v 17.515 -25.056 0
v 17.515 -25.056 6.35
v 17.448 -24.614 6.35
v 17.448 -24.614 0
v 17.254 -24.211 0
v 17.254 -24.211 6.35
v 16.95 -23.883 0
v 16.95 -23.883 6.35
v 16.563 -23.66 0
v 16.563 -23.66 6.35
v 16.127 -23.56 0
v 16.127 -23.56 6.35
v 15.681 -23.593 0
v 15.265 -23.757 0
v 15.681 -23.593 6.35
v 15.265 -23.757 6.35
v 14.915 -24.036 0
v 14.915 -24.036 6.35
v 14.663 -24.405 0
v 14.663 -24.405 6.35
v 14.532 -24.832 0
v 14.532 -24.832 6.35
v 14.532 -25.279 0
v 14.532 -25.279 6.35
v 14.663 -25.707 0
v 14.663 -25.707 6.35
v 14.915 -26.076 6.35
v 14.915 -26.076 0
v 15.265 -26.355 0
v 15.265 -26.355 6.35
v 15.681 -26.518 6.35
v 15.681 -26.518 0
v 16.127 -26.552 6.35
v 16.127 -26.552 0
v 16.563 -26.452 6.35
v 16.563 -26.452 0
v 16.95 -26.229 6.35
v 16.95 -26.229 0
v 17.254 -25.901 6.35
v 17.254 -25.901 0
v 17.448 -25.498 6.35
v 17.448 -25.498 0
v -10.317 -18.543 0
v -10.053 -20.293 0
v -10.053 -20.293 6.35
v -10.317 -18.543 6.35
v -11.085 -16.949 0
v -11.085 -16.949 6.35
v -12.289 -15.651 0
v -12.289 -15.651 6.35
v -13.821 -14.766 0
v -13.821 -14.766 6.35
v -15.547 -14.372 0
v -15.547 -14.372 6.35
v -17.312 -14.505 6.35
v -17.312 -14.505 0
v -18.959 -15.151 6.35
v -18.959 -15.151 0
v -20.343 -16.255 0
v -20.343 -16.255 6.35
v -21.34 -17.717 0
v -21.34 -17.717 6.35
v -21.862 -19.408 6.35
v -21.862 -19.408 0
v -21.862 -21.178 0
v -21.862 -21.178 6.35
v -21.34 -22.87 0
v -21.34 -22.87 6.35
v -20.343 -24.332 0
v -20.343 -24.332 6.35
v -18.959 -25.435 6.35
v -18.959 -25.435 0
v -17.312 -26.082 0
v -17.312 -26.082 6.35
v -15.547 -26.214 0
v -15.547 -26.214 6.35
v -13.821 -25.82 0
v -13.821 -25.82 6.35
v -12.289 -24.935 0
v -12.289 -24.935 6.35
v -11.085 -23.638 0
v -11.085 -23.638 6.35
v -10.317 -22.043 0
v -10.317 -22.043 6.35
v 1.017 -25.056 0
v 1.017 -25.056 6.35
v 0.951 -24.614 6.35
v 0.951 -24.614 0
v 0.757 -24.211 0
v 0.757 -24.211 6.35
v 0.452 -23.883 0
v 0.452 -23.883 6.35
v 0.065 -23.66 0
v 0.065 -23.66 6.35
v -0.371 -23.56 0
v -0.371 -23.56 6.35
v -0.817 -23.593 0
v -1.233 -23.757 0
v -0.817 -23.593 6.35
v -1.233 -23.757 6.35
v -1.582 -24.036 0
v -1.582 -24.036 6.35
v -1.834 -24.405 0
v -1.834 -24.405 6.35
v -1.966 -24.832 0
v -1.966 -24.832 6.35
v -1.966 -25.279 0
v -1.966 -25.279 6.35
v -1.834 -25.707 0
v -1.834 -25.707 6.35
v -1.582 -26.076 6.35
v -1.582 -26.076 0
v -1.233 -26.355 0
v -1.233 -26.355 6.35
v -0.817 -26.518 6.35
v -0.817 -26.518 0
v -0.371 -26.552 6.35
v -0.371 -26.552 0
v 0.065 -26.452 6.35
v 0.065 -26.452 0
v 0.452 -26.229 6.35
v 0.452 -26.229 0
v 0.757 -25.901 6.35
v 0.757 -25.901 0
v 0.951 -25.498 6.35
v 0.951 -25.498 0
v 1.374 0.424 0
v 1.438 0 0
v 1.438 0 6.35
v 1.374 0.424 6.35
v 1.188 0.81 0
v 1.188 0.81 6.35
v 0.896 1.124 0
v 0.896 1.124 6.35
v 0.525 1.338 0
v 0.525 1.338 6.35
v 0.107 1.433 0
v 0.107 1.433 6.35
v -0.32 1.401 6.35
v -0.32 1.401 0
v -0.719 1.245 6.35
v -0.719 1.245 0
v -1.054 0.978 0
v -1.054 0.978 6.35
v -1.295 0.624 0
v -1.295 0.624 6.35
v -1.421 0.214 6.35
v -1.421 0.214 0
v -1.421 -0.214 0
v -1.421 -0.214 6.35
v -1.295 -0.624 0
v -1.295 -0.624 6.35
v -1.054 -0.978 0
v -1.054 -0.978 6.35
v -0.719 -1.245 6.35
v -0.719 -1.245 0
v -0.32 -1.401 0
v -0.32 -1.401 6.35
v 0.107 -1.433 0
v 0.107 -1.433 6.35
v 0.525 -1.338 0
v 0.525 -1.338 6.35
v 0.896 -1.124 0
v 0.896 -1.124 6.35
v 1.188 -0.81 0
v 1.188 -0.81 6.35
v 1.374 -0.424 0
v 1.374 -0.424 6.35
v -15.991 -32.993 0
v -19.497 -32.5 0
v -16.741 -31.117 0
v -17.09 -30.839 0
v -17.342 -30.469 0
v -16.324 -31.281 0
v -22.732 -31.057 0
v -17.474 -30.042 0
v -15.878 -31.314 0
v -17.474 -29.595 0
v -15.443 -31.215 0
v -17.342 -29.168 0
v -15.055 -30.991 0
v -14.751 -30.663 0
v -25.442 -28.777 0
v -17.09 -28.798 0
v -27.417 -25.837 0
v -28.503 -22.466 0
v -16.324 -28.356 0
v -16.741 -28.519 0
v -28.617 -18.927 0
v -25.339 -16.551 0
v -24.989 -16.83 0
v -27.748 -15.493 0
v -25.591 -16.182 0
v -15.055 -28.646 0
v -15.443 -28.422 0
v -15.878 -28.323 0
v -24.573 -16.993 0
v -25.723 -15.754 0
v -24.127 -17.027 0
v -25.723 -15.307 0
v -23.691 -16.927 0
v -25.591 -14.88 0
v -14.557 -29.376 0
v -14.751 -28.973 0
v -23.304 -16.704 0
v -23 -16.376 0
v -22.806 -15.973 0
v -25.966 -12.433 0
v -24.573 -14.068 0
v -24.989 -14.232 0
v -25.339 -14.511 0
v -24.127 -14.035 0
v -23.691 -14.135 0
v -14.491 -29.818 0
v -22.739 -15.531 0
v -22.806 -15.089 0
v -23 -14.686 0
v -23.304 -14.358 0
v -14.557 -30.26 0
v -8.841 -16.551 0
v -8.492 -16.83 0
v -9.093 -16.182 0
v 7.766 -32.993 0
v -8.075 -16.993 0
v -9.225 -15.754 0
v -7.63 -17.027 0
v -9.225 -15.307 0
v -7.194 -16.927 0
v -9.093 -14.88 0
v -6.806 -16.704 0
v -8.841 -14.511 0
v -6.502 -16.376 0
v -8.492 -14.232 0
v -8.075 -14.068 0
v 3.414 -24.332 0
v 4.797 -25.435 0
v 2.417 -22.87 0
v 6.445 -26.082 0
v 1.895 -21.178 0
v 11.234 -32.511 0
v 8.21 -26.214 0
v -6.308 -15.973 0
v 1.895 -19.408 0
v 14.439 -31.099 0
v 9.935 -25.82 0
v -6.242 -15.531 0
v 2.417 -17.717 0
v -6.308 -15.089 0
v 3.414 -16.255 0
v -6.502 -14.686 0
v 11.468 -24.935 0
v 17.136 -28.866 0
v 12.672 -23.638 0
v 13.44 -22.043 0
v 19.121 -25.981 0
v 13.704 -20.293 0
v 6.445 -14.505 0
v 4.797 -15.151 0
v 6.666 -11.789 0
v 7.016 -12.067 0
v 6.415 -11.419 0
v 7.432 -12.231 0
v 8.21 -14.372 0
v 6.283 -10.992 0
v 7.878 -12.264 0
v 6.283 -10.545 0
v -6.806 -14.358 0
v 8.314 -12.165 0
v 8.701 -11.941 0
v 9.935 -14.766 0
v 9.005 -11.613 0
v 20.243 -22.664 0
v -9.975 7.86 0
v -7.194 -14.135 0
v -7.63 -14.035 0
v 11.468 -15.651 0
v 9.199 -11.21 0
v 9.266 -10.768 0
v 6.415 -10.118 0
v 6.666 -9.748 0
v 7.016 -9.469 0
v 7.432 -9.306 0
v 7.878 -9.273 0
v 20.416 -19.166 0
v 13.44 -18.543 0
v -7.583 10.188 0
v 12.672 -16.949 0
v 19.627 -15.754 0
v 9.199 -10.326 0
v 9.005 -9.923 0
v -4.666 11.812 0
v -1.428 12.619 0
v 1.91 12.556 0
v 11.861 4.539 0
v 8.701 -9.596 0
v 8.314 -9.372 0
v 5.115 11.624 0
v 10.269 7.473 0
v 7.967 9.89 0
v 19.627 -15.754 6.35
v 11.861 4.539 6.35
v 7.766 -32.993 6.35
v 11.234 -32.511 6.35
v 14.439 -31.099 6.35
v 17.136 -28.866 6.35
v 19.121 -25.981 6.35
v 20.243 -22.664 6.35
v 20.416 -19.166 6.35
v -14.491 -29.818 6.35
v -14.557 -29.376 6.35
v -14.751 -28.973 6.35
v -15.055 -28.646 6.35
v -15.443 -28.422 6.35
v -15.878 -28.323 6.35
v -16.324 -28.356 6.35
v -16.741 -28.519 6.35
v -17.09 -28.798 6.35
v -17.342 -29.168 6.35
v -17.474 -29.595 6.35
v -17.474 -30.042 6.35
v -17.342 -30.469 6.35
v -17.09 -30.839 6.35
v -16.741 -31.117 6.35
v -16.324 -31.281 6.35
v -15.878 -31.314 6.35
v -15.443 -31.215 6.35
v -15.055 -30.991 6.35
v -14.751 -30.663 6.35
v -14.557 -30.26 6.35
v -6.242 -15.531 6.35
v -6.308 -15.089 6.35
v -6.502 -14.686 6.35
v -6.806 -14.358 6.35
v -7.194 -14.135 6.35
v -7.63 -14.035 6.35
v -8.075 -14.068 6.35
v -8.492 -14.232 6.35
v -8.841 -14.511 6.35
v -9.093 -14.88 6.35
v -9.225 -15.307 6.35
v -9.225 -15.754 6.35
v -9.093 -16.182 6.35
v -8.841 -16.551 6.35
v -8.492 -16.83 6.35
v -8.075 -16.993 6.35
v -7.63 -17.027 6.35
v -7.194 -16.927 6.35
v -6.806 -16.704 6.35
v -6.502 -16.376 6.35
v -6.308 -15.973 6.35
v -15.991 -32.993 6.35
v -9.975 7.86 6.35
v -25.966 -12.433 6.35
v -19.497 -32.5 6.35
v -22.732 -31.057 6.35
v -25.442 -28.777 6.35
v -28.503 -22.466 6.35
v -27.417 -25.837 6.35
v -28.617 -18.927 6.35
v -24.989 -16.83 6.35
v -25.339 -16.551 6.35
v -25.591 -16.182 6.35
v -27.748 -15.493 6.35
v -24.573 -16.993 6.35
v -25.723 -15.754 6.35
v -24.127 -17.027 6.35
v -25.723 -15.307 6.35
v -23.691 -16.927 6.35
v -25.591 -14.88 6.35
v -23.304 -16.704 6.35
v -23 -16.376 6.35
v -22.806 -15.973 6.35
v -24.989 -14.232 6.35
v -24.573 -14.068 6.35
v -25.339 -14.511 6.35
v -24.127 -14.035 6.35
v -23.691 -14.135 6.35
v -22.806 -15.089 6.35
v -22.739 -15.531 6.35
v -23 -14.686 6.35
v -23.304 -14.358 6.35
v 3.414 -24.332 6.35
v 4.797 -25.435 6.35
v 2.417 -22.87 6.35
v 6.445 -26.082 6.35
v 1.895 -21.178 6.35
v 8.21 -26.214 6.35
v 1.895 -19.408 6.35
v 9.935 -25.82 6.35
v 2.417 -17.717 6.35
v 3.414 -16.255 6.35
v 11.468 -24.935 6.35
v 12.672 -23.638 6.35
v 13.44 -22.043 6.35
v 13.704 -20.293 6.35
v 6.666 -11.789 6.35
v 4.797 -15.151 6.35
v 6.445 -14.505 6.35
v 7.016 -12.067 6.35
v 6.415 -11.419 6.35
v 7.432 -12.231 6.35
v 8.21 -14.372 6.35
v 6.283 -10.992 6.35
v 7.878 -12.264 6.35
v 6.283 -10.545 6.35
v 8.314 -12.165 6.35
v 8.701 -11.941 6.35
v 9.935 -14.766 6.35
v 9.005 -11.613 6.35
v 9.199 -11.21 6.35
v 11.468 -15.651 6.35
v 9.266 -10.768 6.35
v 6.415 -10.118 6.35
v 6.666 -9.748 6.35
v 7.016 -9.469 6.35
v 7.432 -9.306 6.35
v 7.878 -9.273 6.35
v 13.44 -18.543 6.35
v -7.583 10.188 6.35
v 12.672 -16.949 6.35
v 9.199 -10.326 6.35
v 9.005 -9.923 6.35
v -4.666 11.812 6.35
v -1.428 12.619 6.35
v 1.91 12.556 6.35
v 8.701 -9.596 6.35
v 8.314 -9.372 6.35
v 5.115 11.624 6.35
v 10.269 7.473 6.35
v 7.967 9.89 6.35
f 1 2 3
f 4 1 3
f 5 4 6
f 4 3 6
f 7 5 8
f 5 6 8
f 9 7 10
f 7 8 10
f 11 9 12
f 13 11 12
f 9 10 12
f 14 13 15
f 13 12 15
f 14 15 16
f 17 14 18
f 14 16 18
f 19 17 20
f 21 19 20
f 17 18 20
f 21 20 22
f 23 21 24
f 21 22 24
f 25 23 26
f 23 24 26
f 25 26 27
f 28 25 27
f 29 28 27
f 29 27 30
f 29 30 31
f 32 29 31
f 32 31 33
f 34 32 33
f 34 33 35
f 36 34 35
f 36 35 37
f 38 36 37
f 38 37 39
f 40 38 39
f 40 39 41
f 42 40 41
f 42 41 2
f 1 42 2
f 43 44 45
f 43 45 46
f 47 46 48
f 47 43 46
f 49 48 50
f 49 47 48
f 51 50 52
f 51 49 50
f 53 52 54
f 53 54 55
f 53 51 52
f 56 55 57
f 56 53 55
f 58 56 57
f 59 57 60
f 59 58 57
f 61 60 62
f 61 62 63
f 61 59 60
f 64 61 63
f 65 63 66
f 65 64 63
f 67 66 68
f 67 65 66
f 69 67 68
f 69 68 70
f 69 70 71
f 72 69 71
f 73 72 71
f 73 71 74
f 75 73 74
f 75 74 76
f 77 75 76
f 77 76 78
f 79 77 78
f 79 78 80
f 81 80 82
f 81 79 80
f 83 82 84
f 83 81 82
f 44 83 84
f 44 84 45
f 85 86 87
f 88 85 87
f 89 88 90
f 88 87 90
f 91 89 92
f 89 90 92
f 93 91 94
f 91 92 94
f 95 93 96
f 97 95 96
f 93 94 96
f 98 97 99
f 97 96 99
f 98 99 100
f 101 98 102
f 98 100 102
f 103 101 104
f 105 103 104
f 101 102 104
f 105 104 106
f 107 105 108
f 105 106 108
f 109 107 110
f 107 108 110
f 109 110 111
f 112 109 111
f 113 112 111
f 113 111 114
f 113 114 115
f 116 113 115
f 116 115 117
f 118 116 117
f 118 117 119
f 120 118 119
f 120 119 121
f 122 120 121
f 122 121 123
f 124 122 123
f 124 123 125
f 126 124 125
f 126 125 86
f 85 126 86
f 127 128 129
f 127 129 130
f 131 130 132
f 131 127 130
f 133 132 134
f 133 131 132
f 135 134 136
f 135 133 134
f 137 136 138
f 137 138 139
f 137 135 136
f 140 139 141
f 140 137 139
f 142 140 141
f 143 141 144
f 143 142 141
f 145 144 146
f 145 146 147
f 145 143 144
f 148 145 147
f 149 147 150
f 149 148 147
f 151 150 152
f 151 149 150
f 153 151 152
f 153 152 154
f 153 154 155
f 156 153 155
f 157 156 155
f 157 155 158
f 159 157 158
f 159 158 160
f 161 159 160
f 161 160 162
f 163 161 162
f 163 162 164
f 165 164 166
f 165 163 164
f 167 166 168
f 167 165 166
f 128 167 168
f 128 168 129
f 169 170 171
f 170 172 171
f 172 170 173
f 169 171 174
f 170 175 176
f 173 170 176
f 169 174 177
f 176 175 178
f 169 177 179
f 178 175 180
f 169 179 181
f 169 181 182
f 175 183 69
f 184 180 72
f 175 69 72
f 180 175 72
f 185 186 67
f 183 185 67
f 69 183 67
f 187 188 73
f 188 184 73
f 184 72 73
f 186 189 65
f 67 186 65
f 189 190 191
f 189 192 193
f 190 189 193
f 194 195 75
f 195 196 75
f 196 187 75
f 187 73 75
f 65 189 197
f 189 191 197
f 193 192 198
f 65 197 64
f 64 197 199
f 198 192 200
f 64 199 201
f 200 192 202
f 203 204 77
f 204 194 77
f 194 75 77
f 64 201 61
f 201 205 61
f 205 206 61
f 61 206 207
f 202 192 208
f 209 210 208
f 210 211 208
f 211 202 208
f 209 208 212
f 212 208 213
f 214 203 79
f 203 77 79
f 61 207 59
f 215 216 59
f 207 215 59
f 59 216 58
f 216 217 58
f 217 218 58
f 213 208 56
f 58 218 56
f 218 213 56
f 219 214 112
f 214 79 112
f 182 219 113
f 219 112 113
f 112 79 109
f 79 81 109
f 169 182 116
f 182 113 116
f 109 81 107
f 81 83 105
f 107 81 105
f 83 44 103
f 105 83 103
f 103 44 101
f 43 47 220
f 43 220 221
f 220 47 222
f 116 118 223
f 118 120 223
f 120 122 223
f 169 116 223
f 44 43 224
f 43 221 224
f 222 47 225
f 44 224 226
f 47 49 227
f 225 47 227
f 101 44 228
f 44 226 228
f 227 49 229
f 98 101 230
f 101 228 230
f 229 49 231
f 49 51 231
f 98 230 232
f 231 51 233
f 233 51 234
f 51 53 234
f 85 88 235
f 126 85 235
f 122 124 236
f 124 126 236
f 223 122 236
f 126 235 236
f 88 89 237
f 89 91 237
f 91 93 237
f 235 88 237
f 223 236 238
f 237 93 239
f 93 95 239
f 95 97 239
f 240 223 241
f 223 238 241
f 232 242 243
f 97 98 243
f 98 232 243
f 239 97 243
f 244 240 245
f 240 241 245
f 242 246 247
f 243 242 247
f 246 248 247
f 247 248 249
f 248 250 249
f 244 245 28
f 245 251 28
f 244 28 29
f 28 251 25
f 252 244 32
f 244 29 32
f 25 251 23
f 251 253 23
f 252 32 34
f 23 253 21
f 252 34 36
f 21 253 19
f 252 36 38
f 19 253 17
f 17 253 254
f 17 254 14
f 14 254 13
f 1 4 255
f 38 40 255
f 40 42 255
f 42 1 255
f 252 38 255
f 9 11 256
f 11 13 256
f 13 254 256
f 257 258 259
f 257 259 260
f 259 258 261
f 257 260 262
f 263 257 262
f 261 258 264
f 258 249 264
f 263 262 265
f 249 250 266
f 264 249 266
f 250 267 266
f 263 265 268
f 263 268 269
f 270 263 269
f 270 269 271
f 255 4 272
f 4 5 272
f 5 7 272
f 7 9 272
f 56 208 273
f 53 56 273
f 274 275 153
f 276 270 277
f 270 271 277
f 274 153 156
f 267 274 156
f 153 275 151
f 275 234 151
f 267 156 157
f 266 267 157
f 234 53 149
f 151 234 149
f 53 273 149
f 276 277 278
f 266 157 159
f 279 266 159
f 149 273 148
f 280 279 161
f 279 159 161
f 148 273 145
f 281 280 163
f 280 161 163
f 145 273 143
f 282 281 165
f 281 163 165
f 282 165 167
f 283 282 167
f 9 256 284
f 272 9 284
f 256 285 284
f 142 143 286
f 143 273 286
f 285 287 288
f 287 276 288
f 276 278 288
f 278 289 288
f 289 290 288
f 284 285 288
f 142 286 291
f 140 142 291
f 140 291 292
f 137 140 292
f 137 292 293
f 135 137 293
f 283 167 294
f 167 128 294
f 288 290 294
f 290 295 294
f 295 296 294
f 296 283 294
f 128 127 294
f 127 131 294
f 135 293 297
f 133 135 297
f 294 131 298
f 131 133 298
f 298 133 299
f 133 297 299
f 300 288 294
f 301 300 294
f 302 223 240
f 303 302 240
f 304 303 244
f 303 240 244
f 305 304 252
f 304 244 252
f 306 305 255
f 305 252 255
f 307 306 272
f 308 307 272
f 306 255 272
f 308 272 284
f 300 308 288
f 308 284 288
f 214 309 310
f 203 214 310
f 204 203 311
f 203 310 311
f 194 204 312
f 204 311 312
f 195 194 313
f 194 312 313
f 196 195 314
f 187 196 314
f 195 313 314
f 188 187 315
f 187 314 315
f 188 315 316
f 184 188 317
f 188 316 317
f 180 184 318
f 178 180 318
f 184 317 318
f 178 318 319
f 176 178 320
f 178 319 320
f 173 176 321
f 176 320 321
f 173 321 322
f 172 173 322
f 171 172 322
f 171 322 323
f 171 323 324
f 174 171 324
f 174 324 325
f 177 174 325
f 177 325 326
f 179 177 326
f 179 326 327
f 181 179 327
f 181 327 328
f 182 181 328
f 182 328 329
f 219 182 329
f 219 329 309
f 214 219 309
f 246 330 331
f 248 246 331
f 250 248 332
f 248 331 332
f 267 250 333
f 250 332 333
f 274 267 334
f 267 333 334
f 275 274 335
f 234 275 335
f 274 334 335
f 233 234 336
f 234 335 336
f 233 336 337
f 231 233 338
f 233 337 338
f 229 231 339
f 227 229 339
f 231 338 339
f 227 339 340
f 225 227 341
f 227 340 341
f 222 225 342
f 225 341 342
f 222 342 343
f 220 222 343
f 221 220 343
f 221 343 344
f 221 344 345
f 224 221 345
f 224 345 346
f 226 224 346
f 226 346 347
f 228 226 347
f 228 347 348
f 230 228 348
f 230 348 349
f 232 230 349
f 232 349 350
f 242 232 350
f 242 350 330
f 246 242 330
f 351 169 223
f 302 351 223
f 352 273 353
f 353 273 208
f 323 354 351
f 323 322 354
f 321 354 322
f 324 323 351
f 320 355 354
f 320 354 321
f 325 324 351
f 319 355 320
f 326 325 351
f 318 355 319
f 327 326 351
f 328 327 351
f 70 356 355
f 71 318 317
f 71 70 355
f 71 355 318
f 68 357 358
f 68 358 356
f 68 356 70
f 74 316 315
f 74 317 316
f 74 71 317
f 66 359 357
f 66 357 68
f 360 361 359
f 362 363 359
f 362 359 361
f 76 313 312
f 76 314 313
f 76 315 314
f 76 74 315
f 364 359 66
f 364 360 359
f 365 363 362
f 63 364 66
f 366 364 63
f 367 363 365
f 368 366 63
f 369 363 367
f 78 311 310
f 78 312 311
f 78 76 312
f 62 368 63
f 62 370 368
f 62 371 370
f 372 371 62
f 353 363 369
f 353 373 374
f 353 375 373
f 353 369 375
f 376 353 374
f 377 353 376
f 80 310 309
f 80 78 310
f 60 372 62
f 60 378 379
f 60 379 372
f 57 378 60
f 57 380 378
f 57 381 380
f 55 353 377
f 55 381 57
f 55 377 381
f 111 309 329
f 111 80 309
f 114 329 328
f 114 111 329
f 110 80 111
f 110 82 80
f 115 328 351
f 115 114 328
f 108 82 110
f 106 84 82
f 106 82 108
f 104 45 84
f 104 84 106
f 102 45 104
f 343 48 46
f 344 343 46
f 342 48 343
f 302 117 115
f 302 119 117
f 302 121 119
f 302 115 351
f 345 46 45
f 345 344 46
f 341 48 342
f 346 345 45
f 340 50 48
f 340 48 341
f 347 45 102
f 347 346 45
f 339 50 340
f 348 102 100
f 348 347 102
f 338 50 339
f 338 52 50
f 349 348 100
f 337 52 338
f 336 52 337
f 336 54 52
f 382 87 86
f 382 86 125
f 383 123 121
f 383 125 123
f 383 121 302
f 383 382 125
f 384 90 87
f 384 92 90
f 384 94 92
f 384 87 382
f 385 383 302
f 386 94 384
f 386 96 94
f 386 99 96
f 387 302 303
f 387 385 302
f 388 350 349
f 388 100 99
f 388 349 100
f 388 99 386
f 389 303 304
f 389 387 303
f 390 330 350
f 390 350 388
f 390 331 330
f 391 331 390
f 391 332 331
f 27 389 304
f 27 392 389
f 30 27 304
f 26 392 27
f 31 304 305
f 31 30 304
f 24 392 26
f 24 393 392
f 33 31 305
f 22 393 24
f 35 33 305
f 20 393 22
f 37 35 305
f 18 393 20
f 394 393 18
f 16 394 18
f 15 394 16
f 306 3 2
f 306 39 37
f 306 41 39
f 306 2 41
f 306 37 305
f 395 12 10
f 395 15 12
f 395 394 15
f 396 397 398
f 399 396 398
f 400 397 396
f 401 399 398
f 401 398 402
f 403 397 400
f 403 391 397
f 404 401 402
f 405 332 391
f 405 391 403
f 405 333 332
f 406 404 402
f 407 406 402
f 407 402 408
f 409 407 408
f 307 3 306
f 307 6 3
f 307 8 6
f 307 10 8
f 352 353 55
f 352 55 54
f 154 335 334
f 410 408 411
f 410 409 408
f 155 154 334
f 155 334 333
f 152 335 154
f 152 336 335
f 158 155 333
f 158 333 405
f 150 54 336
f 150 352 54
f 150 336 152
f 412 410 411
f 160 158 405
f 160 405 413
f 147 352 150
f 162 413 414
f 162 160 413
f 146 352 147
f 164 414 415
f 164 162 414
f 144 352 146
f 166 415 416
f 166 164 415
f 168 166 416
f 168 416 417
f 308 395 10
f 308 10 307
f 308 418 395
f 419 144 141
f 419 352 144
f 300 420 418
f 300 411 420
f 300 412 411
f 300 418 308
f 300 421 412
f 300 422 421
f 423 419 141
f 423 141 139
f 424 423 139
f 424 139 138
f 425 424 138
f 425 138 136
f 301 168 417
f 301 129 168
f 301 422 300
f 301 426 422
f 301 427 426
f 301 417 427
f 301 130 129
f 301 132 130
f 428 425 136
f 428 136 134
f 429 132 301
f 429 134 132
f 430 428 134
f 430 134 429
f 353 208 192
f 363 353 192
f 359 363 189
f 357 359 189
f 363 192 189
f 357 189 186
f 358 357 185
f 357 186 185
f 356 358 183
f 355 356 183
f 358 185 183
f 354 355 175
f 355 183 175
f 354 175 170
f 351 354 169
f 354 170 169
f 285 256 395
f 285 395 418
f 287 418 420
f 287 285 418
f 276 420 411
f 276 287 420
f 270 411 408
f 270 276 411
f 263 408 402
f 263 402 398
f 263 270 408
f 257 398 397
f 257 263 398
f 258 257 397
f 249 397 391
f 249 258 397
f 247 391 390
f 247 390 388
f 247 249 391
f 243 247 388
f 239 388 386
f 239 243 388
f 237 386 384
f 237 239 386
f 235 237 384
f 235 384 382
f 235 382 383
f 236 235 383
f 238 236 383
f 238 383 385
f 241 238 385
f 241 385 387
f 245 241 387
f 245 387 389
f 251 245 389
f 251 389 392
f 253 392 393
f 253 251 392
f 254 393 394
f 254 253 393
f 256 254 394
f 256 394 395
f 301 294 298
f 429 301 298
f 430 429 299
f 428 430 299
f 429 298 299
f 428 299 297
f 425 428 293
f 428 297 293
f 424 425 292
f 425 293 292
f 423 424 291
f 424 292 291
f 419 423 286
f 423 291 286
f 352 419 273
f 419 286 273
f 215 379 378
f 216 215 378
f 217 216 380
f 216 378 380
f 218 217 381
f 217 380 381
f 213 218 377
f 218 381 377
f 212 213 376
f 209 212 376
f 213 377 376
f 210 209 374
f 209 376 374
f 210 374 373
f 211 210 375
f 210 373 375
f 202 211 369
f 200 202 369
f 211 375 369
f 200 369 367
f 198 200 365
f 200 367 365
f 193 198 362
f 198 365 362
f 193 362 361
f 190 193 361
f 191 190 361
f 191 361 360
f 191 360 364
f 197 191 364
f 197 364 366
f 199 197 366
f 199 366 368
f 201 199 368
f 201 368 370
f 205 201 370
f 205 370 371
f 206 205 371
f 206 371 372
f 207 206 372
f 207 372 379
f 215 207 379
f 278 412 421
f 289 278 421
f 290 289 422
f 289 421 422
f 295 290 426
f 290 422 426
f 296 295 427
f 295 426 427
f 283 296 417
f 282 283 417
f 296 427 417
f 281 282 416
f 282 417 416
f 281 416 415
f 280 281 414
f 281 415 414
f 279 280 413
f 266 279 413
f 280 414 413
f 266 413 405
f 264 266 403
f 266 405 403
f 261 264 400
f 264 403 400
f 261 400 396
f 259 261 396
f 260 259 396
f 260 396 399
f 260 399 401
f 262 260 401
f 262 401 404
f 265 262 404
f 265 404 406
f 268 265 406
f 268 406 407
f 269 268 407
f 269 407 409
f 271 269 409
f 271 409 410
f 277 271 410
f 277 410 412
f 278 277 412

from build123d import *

# Parameters (mm, degrees)
SKETCH1_R           = 5.9375
SKETCH1_R_2         = 1.4375
BOSS_EXTRUDE1_DEPTH = 6.35
SKETCH8_R           = 1.5
CUT_EXTRUDE1_DEPTH  = 45.18177233


with BuildPart() as part:
    # Sketch1 → Boss-Extrude1 (new body)
    with BuildSketch(Plane.XY):
        with BuildLine():
            ThreePointArc((7.766045394, -32.993333104), (18.228763262, -27.492050685), (19.627171546, -15.754204728))
            Line((19.627171546, -15.754204728), (11.861126152, 4.539128375))
            ThreePointArc((11.861126152, 4.539128375), (1.909586496, 12.555615453), (-9.975303898, 7.860236137))
            Line((-9.975303898, 7.860236137), (-25.965833293, -12.433096966))
            ThreePointArc((-25.965833293, -12.433096966), (-27.416705459, -25.837023258), (-15.990529394, -32.993333104))
            Line((-15.990529394, -32.993333104), (7.766045394, -32.993333104))
        make_face()
        with Locations((-15.990529394, -20.293333104)):
            Circle(SKETCH1_R, mode=Mode.SUBTRACT)
        with Locations((7.766045394, -20.293333104)):
            Circle(SKETCH1_R, mode=Mode.SUBTRACT)
        Circle(SKETCH1_R_2, mode=Mode.SUBTRACT)
    extrude(amount=BOSS_EXTRUDE1_DEPTH)

    # Sketch8 → Cut-Extrude1 (cut, through all)
    with BuildSketch(Plane.XY.offset(6.35)):
        with Locations((7.766045394, -10.768333104)):
            Circle(SKETCH8_R)
        with Locations((-15.990529394, -29.818333104)):
            Circle(SKETCH8_R)
        with Locations((-24.239421365, -15.530833104)):
            Circle(SKETCH8_R)
        with Locations((-7.741637423, -15.530833104)):
            Circle(SKETCH8_R)
        with Locations((16.014937365, -25.055833104)):
            Circle(SKETCH8_R)
        with Locations((-0.482846577, -25.055833104)):
            Circle(SKETCH8_R)
    extrude(amount=-CUT_EXTRUDE1_DEPTH, mode=Mode.SUBTRACT)


solid = part.part
